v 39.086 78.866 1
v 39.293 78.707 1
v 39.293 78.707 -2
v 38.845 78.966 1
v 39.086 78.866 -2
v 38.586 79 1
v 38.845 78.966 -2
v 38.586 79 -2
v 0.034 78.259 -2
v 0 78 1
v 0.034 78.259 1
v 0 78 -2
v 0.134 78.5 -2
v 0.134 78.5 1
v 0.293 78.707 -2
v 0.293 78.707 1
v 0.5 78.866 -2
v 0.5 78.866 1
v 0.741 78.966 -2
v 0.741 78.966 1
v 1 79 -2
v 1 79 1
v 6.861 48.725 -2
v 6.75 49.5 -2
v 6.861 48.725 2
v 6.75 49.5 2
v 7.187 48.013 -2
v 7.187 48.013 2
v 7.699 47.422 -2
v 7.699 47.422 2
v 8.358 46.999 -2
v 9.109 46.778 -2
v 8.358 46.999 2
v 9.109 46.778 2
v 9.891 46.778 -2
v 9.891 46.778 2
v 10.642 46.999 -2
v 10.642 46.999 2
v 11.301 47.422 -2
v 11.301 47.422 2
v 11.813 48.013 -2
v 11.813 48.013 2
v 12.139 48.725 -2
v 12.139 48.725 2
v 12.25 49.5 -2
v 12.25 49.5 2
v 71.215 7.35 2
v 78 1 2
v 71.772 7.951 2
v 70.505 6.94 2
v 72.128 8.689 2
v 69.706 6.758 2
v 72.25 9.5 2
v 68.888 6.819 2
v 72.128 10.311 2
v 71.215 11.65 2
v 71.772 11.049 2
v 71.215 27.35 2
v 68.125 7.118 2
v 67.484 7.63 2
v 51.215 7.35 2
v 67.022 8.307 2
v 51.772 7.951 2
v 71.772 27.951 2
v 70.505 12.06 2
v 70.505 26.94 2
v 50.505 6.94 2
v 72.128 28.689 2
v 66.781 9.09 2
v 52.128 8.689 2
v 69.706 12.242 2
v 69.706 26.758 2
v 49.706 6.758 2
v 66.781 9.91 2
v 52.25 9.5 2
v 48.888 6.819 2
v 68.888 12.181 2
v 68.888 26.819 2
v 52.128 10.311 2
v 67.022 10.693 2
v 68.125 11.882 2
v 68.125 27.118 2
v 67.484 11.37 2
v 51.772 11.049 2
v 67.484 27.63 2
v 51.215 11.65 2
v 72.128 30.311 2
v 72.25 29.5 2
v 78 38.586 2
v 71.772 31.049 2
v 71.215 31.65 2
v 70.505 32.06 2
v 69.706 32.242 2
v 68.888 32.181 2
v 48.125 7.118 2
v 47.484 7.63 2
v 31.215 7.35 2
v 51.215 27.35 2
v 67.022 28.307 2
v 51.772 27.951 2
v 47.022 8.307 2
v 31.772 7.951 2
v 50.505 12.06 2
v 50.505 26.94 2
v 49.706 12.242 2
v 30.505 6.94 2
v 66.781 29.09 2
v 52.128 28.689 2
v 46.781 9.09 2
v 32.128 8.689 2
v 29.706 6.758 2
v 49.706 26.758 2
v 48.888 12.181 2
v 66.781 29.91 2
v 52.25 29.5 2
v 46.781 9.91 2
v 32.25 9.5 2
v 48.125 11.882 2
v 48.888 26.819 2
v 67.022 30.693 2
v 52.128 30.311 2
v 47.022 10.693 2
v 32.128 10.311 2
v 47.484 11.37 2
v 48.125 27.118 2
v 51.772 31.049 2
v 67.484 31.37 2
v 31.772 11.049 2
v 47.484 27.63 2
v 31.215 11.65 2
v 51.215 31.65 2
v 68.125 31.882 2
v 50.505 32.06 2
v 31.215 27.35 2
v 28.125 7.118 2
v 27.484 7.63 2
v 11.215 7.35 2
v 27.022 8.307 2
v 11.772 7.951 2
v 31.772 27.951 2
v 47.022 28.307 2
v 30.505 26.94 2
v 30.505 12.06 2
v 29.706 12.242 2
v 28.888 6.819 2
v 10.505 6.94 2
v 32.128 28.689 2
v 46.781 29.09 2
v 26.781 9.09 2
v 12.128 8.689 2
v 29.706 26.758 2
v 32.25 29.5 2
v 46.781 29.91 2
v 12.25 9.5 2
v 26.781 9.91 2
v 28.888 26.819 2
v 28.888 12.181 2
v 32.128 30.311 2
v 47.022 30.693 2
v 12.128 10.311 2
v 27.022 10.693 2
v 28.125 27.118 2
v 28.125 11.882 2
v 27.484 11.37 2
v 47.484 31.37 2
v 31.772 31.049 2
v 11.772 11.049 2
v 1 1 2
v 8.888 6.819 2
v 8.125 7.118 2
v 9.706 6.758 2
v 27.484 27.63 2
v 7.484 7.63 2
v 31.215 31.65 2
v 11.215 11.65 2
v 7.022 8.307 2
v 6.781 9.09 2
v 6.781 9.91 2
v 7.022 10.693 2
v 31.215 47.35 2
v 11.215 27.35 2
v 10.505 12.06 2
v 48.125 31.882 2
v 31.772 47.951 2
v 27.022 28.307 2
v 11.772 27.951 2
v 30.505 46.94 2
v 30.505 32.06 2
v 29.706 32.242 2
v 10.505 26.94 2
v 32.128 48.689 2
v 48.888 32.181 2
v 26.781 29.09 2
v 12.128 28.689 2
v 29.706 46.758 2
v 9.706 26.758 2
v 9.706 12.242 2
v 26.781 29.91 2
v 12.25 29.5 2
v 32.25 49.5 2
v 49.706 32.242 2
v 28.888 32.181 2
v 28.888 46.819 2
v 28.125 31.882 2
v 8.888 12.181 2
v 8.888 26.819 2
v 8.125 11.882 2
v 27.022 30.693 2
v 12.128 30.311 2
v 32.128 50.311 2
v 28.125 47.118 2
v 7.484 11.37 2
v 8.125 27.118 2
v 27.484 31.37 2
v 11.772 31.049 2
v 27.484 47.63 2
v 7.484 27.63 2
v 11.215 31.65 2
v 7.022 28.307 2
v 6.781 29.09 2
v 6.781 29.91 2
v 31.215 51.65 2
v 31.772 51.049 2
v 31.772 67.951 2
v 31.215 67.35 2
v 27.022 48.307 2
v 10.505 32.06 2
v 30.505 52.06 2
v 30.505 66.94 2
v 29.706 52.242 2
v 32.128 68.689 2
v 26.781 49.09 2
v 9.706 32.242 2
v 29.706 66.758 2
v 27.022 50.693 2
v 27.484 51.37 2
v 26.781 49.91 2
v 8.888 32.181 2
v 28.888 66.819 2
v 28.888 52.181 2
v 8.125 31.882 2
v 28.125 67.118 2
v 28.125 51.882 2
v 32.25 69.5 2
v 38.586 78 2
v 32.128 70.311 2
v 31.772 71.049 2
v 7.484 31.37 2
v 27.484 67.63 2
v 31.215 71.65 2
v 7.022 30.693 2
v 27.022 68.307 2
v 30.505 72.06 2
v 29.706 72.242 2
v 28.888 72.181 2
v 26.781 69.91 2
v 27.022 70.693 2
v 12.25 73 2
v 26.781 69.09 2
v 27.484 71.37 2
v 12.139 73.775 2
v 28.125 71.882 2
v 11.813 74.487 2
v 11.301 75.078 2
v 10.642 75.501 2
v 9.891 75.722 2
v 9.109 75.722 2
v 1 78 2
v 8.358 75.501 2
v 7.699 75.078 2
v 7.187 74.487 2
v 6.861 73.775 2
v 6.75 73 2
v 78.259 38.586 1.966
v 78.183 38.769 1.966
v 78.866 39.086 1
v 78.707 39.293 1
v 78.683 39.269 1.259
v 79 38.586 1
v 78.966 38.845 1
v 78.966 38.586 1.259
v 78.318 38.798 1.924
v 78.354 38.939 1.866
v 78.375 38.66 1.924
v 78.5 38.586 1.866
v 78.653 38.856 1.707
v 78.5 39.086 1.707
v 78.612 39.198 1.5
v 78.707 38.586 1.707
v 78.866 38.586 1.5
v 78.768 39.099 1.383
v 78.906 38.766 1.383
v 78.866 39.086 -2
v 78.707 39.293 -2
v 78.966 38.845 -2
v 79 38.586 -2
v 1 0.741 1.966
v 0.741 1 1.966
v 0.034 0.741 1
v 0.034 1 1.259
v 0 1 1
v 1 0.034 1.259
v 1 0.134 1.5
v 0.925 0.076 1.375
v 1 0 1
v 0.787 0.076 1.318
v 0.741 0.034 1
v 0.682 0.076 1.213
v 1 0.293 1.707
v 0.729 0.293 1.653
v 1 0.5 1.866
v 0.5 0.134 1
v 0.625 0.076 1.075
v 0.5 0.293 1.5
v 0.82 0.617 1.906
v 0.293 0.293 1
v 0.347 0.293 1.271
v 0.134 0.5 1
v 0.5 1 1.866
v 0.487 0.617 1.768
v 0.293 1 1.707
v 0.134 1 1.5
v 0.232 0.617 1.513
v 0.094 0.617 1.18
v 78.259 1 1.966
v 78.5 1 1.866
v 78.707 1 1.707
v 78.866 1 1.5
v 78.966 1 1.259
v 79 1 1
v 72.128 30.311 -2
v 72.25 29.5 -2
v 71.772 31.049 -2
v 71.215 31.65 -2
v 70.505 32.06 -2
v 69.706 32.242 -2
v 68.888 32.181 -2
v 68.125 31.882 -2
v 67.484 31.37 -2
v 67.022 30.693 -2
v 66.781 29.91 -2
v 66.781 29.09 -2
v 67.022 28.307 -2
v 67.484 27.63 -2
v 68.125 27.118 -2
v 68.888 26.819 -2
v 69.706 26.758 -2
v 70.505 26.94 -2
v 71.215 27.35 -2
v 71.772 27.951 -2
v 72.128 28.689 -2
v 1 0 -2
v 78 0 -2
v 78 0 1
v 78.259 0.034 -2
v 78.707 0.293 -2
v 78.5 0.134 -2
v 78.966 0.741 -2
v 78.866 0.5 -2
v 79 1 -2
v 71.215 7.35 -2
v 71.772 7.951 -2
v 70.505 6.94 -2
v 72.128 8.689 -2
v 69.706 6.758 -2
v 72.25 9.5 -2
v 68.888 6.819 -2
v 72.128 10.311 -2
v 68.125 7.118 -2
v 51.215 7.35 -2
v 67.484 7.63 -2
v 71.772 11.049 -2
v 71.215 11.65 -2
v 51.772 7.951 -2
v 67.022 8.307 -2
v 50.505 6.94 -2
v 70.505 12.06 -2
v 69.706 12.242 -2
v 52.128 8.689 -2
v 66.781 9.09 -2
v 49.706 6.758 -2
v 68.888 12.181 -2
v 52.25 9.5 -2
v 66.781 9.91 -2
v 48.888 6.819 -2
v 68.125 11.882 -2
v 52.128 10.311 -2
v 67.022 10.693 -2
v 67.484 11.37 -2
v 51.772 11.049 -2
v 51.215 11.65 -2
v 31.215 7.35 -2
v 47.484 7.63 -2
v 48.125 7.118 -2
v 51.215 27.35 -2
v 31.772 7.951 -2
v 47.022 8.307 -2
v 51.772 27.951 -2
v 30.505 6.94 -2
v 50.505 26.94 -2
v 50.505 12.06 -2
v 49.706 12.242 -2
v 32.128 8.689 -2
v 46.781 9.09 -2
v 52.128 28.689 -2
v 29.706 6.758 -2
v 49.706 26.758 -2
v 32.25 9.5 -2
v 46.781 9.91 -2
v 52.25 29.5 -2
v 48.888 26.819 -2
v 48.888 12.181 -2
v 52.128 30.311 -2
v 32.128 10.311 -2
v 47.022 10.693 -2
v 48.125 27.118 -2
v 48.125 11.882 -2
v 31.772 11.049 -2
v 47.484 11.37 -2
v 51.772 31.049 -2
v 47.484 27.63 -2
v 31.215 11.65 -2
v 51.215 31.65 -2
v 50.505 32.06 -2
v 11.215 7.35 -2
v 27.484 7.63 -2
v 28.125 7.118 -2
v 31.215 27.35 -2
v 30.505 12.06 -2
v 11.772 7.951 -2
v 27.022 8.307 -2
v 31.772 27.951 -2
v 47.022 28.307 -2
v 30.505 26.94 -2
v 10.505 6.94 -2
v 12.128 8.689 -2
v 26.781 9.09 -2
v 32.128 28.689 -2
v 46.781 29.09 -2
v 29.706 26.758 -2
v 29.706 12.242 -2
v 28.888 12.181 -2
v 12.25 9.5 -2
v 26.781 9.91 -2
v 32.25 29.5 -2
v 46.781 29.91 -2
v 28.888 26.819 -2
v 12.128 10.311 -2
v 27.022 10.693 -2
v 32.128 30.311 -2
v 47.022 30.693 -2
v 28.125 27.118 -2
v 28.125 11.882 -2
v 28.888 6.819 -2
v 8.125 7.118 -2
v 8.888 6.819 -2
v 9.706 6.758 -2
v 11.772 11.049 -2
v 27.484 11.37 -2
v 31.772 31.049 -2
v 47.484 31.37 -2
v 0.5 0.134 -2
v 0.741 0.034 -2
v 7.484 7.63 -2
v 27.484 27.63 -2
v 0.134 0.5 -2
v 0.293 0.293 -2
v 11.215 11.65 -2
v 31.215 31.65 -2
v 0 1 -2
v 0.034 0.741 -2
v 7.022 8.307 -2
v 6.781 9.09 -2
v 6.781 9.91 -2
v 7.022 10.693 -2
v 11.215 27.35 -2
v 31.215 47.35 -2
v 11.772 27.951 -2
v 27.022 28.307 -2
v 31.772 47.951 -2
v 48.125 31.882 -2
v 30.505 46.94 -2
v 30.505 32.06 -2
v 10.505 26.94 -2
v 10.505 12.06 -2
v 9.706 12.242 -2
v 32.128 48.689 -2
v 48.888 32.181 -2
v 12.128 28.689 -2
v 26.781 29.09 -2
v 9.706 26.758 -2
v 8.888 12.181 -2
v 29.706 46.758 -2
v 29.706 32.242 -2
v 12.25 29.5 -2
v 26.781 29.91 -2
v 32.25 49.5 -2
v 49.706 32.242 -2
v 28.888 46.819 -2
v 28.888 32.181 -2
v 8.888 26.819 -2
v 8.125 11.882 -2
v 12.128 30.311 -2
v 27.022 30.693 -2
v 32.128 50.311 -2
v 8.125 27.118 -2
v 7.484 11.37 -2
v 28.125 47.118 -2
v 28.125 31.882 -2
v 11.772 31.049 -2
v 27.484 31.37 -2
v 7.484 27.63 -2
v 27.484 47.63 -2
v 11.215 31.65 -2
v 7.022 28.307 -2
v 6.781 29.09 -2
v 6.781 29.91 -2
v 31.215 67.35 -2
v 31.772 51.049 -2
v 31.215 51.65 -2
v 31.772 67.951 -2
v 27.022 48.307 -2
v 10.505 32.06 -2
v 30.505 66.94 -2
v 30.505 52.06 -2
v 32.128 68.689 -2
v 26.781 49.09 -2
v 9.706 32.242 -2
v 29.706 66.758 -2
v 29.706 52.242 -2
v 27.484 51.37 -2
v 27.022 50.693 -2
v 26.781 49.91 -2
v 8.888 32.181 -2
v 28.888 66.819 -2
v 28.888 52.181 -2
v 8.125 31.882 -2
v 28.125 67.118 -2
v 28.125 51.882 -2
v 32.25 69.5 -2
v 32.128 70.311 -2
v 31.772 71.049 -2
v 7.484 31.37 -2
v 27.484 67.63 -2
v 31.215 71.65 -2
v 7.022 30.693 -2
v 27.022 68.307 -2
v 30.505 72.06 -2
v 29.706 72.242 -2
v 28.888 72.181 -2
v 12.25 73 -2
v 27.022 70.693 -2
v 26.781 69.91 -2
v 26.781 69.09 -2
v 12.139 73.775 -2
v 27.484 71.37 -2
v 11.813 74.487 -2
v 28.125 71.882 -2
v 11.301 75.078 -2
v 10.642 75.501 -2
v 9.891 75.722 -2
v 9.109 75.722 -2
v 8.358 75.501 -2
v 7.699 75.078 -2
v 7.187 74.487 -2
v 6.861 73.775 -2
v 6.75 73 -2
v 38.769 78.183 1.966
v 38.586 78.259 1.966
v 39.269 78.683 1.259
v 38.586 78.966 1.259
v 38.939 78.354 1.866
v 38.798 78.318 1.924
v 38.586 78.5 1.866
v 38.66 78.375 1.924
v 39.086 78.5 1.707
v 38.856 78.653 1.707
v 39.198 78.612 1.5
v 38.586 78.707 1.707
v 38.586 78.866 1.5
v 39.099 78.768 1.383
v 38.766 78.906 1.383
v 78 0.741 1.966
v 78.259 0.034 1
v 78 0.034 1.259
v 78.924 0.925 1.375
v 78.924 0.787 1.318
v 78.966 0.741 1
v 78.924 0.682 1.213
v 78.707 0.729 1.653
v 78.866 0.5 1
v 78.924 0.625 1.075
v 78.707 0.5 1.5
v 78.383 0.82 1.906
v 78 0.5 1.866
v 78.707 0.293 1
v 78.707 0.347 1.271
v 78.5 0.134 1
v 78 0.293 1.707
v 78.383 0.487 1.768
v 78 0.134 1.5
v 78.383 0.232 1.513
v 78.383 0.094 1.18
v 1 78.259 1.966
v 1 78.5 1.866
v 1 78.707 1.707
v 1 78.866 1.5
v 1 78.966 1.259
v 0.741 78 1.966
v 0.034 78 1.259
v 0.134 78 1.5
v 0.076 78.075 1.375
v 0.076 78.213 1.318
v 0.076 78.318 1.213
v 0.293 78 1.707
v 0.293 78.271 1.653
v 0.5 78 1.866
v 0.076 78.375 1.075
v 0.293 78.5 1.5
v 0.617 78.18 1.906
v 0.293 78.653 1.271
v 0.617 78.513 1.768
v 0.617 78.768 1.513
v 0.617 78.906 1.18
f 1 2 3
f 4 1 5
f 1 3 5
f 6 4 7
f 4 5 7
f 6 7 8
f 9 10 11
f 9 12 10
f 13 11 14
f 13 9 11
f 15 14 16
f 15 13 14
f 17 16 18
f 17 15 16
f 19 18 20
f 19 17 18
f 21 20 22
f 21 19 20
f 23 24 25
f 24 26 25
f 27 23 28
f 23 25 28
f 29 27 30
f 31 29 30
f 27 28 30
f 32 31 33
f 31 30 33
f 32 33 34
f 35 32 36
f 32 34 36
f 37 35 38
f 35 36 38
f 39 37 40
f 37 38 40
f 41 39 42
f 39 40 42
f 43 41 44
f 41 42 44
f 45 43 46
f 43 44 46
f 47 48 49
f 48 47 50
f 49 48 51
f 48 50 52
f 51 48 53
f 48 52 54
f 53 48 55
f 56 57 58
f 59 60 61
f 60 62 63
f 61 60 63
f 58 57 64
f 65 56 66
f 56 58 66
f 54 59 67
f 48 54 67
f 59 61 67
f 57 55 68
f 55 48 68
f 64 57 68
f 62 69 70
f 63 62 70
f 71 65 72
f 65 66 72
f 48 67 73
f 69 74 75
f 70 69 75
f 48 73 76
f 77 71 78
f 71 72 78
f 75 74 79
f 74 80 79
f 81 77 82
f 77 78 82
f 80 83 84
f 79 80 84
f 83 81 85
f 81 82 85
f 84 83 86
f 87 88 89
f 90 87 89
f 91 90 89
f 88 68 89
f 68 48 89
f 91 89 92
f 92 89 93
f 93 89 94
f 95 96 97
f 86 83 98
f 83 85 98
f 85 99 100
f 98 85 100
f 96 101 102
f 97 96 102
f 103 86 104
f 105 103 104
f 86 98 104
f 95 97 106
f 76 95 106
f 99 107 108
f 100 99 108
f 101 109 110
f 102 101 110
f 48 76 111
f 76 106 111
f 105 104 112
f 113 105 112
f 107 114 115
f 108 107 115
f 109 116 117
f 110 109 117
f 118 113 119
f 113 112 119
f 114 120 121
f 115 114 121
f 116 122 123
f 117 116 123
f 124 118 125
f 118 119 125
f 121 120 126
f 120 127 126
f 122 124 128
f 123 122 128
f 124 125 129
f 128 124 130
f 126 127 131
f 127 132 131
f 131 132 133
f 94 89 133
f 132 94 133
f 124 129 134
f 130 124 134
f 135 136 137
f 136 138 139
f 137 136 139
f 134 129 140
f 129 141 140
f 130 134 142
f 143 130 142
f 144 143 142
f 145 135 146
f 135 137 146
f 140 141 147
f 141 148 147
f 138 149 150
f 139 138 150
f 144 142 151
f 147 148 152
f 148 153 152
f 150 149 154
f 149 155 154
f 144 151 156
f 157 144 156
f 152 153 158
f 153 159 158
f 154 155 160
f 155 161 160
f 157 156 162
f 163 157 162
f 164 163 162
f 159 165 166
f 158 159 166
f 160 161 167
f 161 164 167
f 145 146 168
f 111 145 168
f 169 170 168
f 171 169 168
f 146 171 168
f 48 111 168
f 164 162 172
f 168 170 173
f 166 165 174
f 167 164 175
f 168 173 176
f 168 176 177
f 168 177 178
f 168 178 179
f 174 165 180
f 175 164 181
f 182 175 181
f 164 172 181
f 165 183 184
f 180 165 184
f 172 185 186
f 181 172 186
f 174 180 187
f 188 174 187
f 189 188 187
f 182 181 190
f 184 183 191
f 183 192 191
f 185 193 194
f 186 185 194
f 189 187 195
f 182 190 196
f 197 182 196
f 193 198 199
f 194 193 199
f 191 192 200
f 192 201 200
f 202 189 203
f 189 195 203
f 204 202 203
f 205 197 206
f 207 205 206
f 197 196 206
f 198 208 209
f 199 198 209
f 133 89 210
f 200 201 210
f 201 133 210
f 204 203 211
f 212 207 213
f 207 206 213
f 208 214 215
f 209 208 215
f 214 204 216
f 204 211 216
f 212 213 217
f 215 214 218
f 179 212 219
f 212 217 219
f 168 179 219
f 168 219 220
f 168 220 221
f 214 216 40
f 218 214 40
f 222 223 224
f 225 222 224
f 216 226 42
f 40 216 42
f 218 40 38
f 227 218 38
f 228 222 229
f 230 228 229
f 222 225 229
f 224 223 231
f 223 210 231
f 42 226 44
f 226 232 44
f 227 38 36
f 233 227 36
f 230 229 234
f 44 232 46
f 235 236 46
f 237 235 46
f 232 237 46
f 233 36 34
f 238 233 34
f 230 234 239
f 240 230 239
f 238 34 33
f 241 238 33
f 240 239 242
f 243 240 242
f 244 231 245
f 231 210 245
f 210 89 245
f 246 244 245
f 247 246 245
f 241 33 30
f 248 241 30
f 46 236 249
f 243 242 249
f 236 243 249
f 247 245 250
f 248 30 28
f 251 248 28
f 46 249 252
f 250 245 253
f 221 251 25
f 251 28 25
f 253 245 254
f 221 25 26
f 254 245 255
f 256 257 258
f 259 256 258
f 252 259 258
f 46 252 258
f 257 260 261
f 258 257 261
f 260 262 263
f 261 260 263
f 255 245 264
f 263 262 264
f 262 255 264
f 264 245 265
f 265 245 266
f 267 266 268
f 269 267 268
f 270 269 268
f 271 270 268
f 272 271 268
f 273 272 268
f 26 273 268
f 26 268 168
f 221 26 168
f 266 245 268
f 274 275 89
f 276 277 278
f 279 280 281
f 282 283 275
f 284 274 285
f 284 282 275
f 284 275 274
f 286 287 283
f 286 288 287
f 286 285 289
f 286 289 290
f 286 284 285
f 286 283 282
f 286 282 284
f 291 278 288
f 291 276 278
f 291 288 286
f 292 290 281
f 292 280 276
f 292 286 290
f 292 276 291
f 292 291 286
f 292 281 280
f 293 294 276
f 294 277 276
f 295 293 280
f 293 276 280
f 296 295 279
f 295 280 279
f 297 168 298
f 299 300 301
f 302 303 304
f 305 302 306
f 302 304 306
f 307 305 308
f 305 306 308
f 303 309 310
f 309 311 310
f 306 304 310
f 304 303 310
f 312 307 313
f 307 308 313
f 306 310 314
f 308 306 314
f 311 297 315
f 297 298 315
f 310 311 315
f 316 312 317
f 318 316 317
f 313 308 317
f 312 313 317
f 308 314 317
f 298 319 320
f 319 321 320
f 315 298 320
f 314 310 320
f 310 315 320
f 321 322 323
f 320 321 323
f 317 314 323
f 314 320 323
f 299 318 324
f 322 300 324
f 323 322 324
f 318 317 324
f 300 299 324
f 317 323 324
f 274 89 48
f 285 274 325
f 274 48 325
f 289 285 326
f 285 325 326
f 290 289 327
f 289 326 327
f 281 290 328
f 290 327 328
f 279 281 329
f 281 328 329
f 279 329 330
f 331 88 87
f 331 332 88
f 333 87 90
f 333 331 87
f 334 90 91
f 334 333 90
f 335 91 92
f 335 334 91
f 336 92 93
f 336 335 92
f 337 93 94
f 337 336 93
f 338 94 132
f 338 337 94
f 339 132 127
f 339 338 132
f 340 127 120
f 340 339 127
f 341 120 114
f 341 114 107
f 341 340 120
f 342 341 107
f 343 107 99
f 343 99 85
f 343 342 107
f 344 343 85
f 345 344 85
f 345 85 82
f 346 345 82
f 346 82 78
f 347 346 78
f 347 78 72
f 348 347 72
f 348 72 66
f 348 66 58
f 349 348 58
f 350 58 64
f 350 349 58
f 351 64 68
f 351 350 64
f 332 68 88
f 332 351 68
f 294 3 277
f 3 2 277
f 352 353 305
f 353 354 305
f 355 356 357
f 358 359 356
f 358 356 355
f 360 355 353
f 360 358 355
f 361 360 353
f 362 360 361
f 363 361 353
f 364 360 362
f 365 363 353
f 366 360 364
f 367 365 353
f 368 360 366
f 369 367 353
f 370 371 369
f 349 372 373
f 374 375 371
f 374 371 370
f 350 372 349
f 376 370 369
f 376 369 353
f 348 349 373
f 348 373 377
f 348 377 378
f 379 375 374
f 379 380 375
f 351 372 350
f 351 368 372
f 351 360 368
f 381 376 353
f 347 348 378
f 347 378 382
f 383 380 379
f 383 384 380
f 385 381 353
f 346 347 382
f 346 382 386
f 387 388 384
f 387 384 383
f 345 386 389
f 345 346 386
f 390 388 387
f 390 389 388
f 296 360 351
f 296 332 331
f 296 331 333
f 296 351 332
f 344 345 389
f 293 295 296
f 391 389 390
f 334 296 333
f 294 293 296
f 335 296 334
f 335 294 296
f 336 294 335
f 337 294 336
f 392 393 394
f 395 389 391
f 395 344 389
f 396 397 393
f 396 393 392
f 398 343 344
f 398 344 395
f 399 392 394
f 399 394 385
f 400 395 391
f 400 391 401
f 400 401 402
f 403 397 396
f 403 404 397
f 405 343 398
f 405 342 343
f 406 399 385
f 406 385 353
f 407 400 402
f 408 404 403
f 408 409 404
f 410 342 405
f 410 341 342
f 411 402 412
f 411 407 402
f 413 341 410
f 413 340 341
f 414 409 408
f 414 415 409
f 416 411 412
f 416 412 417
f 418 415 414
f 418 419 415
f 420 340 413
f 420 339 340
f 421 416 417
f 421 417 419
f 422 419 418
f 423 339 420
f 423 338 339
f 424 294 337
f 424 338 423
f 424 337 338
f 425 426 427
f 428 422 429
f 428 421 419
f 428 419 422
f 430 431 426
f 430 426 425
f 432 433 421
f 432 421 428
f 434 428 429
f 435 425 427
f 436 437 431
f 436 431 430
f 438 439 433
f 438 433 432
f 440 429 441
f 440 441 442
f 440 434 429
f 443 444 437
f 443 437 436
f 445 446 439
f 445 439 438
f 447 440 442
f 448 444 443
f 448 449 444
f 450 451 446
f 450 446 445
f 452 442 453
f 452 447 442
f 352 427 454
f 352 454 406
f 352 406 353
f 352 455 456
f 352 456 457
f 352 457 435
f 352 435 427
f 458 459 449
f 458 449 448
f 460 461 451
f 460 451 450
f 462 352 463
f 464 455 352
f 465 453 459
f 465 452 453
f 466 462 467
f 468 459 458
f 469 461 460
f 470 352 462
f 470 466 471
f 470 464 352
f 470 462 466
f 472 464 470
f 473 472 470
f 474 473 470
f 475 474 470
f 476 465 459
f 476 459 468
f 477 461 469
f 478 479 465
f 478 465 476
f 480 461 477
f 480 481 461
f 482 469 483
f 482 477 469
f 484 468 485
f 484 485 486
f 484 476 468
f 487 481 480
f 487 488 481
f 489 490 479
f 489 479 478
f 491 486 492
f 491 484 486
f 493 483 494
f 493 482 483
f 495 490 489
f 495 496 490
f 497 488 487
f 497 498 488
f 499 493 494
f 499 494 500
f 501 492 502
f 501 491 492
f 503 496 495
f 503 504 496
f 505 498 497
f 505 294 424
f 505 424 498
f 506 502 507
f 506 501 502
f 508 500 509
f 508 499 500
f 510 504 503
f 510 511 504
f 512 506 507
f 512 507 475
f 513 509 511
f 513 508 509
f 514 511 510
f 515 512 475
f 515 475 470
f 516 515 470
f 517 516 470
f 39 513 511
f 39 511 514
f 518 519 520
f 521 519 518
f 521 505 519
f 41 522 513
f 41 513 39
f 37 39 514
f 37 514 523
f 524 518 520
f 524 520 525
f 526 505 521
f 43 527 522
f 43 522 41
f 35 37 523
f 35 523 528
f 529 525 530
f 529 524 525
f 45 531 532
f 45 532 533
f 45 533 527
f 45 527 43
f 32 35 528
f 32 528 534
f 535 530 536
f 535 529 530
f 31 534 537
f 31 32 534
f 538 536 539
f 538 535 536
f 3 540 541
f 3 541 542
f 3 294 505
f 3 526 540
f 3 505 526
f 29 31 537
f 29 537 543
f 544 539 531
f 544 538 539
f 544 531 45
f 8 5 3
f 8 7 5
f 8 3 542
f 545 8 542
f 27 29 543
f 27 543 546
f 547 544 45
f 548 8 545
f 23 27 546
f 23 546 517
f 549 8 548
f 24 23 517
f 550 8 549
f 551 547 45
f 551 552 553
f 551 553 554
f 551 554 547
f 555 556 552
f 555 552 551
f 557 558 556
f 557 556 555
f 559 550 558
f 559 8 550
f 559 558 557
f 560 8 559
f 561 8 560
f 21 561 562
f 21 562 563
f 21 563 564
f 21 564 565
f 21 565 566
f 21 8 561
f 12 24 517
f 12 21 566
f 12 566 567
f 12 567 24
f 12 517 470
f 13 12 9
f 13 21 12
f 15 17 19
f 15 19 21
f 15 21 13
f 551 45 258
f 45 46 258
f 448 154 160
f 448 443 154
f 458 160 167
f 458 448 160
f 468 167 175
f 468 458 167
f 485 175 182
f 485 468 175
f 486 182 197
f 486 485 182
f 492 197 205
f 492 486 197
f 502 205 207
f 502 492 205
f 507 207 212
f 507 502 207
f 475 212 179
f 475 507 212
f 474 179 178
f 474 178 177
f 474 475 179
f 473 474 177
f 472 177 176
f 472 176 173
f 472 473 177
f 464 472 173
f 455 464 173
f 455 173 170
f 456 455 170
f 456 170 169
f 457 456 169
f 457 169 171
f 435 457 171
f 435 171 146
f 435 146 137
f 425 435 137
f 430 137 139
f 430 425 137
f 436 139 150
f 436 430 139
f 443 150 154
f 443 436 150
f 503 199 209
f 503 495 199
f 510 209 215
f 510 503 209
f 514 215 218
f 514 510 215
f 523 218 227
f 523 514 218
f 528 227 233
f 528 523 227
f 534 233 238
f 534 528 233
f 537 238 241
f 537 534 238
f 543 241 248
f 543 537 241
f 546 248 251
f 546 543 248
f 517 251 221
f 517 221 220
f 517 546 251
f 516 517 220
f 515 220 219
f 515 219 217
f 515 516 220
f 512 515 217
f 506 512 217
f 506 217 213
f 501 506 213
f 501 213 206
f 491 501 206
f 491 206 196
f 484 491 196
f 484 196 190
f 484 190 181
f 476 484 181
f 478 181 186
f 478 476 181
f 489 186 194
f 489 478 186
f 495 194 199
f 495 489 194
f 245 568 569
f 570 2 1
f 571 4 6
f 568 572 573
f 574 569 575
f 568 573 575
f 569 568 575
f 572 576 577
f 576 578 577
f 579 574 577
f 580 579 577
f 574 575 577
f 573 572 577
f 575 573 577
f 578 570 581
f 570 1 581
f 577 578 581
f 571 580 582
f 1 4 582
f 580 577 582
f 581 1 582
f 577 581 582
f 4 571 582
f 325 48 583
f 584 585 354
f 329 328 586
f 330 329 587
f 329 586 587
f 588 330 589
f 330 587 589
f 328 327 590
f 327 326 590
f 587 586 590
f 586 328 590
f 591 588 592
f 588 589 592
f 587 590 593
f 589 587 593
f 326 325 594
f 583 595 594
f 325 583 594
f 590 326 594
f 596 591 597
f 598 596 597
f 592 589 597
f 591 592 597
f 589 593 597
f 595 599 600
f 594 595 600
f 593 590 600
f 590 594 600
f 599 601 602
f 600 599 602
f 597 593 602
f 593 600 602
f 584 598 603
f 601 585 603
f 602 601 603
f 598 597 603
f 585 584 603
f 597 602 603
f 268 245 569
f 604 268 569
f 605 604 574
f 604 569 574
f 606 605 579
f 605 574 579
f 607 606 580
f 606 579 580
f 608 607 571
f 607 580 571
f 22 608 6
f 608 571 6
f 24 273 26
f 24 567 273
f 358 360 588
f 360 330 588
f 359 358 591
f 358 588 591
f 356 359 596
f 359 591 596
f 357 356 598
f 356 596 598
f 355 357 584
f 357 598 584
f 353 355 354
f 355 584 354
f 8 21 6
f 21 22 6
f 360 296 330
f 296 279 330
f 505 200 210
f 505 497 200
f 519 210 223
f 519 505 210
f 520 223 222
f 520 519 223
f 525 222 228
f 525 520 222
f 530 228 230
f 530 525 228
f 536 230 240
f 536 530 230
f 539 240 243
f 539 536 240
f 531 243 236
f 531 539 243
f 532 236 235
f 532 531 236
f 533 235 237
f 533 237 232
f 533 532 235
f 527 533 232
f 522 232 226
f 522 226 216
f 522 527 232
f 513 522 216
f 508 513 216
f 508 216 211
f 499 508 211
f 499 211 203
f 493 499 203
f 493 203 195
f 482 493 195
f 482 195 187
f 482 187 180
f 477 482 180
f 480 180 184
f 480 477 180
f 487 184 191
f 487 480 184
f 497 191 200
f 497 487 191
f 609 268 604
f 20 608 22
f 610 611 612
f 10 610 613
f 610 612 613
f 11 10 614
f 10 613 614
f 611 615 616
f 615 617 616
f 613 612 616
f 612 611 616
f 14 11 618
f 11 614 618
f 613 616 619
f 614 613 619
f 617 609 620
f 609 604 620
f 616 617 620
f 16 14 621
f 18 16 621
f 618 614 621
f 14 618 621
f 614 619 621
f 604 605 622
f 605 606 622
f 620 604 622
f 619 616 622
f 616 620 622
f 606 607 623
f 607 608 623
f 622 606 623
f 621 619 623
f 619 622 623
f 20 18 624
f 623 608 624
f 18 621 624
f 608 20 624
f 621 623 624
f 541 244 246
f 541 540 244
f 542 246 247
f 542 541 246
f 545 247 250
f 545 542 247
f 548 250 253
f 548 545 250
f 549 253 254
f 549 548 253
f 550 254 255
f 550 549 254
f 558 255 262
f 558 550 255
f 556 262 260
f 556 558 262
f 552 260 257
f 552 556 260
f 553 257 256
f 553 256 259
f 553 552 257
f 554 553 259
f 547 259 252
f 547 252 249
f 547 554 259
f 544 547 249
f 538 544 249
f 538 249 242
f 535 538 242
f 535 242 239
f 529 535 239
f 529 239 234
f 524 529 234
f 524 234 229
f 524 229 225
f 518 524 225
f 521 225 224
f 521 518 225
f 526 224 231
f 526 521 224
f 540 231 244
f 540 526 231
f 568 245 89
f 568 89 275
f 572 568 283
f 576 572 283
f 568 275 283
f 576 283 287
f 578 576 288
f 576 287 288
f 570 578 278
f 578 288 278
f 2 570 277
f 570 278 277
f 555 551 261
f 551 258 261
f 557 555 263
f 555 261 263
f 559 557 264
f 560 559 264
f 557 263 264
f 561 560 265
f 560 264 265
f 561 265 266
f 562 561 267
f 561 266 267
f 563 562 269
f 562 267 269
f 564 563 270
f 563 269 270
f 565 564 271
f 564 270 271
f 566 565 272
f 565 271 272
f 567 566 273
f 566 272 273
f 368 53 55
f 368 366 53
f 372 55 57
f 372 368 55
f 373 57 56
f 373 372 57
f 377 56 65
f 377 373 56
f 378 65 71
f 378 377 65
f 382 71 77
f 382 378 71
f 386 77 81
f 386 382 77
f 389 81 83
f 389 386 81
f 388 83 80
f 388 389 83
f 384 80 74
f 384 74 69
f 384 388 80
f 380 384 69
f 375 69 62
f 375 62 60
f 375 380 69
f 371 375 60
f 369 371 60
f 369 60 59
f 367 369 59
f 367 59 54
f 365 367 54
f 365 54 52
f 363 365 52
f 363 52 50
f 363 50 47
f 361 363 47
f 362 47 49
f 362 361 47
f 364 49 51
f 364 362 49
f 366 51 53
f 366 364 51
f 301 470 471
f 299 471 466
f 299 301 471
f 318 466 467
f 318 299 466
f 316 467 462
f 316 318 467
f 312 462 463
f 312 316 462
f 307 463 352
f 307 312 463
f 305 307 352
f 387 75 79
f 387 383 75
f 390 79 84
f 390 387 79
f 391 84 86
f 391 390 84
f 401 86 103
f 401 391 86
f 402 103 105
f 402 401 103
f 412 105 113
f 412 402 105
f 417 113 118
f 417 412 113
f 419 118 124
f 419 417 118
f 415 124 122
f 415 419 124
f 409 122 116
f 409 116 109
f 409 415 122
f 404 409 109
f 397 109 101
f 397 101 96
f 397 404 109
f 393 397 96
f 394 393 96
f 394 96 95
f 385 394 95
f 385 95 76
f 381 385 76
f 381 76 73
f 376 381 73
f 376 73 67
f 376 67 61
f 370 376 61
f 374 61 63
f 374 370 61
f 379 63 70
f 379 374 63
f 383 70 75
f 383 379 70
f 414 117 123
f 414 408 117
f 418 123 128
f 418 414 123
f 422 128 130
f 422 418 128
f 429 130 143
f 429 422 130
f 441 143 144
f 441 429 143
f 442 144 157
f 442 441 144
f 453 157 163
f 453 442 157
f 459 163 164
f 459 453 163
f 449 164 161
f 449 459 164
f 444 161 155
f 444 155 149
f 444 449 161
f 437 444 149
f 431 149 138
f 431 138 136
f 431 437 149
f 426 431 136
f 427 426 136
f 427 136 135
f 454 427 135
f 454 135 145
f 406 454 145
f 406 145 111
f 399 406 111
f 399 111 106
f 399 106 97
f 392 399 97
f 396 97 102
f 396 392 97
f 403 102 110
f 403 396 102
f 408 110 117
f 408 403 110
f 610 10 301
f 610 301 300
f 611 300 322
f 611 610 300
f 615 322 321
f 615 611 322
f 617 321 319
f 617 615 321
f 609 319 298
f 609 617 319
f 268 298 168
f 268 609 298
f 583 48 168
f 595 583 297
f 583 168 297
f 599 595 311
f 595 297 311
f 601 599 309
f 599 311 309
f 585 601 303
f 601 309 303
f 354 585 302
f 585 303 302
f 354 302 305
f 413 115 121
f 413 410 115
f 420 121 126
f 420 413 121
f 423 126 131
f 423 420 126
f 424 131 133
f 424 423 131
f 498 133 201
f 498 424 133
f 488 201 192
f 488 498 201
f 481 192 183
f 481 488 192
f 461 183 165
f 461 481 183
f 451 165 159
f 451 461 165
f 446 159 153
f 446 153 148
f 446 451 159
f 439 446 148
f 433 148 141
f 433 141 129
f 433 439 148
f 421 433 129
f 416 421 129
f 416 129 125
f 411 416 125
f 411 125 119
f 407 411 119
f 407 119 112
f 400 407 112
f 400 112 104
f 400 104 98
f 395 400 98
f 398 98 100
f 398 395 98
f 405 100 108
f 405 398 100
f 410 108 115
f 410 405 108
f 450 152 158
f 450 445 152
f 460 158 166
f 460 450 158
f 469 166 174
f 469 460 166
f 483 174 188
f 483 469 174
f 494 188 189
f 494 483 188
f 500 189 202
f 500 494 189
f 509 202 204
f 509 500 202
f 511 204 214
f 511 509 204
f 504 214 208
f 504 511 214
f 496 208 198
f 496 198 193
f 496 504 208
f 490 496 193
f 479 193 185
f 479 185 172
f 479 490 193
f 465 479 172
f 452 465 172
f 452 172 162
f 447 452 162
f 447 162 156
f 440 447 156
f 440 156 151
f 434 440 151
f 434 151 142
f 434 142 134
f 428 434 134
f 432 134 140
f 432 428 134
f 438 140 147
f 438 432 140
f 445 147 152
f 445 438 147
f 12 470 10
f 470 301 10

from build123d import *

# Parameters (mm, degrees)
SKETCH1_R           = 2.75
BOSS_EXTRUDE1_DEPTH = 2
FILLET1_R           = 1


with BuildPart() as part:
    # Sketch1 → Boss-Extrude1 (new, symmetric)
    with BuildSketch(Plane.XY):
        Polygon((0, 0), (0, 79), (39, 79), (79, 39), (79, 0), align=None)
        with Locations((9.5, 9.5)):
            Circle(SKETCH1_R, mode=Mode.SUBTRACT)
        with Locations((29.5, 9.5)):
            Circle(SKETCH1_R, mode=Mode.SUBTRACT)
        with Locations((49.5, 9.5)):
            Circle(SKETCH1_R, mode=Mode.SUBTRACT)
        with Locations((9.5, 29.5)):
            Circle(SKETCH1_R, mode=Mode.SUBTRACT)
        with Locations((69.5, 9.5)):
            Circle(SKETCH1_R, mode=Mode.SUBTRACT)
        with Locations((69.5, 29.5)):
            Circle(SKETCH1_R, mode=Mode.SUBTRACT)
        with Locations((49.5, 29.5)):
            Circle(SKETCH1_R, mode=Mode.SUBTRACT)
        with Locations((29.5, 29.5)):
            Circle(SKETCH1_R, mode=Mode.SUBTRACT)
        with Locations((29.5, 49.5)):
            Circle(SKETCH1_R, mode=Mode.SUBTRACT)
        with Locations((29.5, 69.5)):
            Circle(SKETCH1_R, mode=Mode.SUBTRACT)
        with BuildLine():
            Line((6.75, 73), (6.75, 49.5))
            ThreePointArc((6.75, 49.5), (9.5, 46.75), (12.25, 49.5))
            Line((12.25, 49.5), (12.25, 73))
            ThreePointArc((12.25, 73), (9.5, 75.75), (6.75, 73))
        make_face(mode=Mode.SUBTRACT)
    extrude(amount=BOSS_EXTRUDE1_DEPTH, both=True)

    # Fillet1
    fillet1_edges = [part.edges().sort_by_distance(p)[0] for p in [
        (59, 59, 2),
        (19.5, 79, 2),
        (0, 39.5, 2),
        (39.5, 0, 2),
        (79, 19.5, 2),
        (0, 0, 0),
        (0, 79, 0),
        (39, 79, 0),
        (79, 39, 0),
        (79, 0, 0),
    ]]
    fillet(fillet1_edges, radius=FILLET1_R)


solid = part.part
